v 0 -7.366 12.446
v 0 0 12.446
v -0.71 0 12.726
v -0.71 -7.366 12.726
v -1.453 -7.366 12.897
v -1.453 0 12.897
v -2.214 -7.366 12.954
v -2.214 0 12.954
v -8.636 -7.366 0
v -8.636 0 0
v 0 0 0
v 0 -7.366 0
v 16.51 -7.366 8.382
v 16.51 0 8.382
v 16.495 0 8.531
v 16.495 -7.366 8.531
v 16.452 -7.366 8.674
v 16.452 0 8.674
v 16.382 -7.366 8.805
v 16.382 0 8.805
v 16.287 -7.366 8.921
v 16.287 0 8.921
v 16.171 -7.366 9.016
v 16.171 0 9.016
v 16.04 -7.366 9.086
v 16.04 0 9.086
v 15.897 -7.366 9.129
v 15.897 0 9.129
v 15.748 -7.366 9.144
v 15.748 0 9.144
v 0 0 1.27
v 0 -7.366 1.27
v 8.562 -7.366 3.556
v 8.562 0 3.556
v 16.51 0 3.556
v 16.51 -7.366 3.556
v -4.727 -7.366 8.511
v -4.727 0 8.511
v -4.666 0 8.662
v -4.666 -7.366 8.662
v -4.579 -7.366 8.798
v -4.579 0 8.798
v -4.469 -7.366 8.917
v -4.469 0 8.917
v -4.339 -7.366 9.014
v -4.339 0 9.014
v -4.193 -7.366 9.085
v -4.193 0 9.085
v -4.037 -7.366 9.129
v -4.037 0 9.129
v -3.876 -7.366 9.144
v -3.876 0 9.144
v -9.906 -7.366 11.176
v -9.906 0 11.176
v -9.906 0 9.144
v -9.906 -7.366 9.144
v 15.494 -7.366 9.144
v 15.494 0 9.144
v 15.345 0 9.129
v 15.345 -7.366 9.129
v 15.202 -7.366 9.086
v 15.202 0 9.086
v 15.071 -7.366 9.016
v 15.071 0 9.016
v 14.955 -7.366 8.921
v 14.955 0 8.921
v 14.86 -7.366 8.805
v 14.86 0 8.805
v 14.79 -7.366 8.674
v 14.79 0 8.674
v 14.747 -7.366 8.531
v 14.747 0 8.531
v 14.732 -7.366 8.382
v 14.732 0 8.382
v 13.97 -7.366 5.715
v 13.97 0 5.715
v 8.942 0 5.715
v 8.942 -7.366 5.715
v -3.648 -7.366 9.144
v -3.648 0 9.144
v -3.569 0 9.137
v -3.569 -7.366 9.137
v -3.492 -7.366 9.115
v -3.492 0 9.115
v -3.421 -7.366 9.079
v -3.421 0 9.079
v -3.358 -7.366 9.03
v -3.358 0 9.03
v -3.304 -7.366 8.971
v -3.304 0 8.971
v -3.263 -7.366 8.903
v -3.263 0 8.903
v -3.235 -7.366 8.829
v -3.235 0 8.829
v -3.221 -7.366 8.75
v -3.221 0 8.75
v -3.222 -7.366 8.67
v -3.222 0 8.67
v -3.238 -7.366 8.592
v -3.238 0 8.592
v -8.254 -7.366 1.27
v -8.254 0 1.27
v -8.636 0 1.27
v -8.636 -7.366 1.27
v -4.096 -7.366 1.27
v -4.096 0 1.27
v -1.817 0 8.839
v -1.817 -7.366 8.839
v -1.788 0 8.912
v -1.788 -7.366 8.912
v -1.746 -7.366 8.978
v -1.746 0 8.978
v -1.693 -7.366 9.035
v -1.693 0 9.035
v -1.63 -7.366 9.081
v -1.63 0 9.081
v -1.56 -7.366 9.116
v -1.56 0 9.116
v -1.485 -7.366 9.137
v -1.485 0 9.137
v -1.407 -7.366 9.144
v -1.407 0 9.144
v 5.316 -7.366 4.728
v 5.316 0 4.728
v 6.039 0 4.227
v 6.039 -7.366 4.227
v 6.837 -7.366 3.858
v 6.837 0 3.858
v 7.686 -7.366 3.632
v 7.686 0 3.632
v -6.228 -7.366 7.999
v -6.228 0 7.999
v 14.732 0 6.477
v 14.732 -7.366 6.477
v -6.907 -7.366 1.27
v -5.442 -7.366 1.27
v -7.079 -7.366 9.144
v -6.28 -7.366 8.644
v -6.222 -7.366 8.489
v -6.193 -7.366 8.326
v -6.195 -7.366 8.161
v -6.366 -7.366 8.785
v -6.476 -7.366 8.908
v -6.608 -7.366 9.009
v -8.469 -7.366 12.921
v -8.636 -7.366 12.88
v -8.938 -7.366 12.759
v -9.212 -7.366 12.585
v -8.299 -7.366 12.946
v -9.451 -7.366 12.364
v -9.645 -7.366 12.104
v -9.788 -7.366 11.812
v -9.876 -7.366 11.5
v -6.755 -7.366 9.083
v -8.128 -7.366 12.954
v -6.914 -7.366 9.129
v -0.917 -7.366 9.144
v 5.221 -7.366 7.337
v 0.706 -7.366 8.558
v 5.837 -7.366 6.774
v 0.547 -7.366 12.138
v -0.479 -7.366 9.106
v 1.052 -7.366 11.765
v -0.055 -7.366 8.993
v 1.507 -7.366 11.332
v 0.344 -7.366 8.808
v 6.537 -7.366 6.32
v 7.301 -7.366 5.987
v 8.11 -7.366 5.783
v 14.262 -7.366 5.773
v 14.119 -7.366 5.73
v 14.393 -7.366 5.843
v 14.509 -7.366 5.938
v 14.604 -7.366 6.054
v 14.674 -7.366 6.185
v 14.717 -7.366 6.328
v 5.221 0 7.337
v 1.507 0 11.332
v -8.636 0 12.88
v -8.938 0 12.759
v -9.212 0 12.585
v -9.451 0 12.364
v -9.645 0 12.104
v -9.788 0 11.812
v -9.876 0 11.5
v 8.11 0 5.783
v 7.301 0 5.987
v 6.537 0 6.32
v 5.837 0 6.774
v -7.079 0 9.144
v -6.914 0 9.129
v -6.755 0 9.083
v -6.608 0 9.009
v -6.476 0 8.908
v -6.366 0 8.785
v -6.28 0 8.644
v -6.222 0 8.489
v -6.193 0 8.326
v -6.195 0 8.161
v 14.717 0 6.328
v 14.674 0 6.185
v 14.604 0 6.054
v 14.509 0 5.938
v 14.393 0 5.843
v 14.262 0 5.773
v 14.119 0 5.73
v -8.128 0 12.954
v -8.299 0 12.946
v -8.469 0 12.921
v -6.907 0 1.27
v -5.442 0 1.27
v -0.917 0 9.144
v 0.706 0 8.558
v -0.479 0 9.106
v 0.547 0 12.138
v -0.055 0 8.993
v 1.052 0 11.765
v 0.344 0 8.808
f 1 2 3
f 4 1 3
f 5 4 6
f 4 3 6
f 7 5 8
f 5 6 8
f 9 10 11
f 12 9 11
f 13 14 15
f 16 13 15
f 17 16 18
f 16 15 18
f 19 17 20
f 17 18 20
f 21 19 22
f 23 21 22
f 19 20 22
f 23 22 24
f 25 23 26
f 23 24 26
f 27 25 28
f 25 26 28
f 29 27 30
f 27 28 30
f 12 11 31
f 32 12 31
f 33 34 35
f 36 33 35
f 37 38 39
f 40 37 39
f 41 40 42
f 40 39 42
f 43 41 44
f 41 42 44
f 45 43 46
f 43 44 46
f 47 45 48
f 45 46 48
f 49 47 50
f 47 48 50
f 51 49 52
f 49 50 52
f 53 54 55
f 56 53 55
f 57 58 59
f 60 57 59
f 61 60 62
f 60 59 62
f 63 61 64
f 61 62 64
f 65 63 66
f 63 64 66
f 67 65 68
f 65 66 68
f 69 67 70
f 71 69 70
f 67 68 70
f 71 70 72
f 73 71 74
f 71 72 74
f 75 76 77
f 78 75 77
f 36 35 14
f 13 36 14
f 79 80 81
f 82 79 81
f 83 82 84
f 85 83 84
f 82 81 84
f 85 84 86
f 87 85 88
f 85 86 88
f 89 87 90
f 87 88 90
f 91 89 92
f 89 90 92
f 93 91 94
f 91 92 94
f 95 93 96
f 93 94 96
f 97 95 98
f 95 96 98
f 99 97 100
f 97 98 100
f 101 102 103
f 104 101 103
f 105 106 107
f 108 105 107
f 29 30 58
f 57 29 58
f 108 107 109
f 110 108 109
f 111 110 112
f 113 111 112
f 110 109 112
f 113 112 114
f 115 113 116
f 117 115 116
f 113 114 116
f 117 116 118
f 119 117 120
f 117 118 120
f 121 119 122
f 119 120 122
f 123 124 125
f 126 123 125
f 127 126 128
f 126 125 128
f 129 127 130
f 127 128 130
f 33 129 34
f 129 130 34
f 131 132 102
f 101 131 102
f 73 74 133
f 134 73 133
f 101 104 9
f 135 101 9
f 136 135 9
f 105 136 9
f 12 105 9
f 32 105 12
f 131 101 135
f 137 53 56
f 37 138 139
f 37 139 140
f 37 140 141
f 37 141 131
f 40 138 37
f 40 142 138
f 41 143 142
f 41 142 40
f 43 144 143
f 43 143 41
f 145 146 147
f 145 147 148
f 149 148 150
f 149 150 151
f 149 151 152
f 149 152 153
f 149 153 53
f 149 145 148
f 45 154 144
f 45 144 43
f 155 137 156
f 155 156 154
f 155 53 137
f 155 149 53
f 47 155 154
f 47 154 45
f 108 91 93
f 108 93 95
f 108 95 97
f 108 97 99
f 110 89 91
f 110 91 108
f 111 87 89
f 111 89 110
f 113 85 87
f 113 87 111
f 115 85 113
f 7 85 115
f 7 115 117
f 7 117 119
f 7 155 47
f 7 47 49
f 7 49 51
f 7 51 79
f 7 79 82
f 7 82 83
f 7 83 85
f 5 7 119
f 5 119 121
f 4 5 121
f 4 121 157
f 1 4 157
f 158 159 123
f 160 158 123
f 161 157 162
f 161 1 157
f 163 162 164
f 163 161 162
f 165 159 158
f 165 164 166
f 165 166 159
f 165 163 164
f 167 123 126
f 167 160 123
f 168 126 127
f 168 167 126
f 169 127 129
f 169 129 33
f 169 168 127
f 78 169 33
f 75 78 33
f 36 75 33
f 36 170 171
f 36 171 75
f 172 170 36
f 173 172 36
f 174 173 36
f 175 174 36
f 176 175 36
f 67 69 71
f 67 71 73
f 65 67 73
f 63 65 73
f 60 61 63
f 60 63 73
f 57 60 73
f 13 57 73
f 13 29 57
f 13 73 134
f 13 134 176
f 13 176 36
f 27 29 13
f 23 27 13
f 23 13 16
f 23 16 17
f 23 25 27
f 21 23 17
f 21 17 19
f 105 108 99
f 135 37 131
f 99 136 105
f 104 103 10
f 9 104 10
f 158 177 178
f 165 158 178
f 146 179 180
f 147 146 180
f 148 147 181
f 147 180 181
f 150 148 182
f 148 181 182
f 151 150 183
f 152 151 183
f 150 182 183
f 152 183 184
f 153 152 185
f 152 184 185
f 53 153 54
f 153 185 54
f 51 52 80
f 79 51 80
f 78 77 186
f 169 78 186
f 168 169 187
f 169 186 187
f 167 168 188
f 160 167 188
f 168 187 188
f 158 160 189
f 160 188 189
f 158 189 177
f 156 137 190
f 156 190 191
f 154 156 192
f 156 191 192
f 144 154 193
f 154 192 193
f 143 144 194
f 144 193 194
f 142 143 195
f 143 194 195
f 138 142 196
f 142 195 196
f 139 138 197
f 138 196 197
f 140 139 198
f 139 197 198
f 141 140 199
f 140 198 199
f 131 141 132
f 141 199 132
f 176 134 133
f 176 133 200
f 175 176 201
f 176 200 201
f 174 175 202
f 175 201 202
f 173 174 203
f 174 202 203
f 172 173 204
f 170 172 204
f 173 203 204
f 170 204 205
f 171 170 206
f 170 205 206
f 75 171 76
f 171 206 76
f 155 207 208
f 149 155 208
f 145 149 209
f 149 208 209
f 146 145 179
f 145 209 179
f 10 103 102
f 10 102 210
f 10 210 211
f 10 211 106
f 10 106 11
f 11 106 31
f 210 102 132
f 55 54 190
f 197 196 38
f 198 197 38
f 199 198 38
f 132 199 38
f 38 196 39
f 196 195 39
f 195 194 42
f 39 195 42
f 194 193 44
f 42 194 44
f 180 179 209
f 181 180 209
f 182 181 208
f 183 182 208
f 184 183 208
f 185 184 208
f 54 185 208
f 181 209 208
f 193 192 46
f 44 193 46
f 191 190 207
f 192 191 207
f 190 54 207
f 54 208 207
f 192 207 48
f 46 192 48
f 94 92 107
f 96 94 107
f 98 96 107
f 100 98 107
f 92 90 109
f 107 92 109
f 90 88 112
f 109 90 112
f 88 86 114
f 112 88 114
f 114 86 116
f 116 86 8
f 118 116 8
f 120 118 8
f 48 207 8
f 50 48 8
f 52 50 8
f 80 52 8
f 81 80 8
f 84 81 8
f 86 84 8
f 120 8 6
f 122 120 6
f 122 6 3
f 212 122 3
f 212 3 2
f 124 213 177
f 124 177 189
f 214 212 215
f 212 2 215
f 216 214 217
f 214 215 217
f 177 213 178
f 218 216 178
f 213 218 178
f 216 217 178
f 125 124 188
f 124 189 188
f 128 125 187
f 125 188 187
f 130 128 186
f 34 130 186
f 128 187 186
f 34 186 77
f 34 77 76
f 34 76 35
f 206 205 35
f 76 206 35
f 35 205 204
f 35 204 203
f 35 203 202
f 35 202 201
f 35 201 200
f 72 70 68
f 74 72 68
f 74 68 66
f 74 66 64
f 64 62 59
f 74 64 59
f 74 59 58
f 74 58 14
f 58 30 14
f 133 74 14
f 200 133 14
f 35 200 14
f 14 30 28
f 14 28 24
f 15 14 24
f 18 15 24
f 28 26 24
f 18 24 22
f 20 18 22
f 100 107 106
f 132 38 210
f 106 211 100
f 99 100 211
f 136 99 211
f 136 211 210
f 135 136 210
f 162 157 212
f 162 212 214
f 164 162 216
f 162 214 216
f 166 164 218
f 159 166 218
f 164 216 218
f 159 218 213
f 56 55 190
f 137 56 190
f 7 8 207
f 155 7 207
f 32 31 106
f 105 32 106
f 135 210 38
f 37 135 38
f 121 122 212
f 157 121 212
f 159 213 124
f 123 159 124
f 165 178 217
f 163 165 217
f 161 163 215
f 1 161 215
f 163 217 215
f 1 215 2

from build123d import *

# Parameters (mm, degrees)
F1_DEPTH = 7.366


with BuildPart() as f1:
    # F0 (on Front) → F1 (new body)
    with BuildSketch(Plane.XZ):
        with BuildLine():
            Line((-2.213933, 12.954), (-8.128, 12.954))
            ThreePointArc((-8.128, 12.954), (-8.384689, 12.935373), (-8.636, 12.879884))
            Line((-8.636, 12.879884), (-8.636, 9.144))
            Line((-8.636, 9.144), (-7.079154, 9.144))
            ThreePointArc((-7.079154, 9.144), (-6.365658, 8.785324), (-6.227896, 7.998719))
            Line((-6.227896, 7.998719), (-8.253652, 1.27))
            Line((-8.253652, 1.27), (-6.907021, 1.27))
            Line((-6.907021, 1.27), (-4.726952, 8.511281))
            ThreePointArc((-4.726952, 8.511281), (-4.406018, 8.968497), (-3.875693, 9.144))
            Line((-3.875693, 9.144), (-3.648131, 9.144))
            ThreePointArc((-3.648131, 9.144), (-3.304393, 8.971202), (-3.238025, 8.592243))
            Line((-3.238025, 8.592243), (-5.442468, 1.27))
            Line((-5.442468, 1.27), (-4.095837, 1.27))
            Line((-4.095837, 1.27), (-1.817051, 8.839178))
            ThreePointArc((-1.817051, 8.839178), (-1.662436, 9.059449), (-1.406944, 9.144))
            Line((-1.406944, 9.144), (-0.917281, 9.144))
            ThreePointArc((-0.917281, 9.144), (-0.054535, 8.992989), (0.705625, 8.557913))
            Line((0.705625, 8.557913), (5.316478, 4.728173))
            ThreePointArc((5.316478, 4.728173), (6.836798, 3.858021), (8.562289, 3.556))
            Line((8.562289, 3.556), (10.439335, 3.556))
            Line((10.439335, 3.556), (16.51, 3.556))
            Line((16.51, 3.556), (16.51, 8.382))
            ThreePointArc((16.51, 8.382), (16.286815, 8.920815), (15.748, 9.144))
            Line((15.748, 9.144), (15.494, 9.144))
            ThreePointArc((15.494, 9.144), (14.955185, 8.920815), (14.732, 8.382))
            Line((14.732, 8.382), (14.732, 6.477))
            ThreePointArc((14.732, 6.477), (14.508815, 5.938185), (13.97, 5.715))
            Line((13.97, 5.715), (10.439335, 5.715))
            Line((10.439335, 5.715), (8.941661, 5.715))
            ThreePointArc((8.941661, 5.715), (6.912095, 6.138042), (5.220557, 7.336708))
            Line((5.220557, 7.336708), (1.507171, 11.332292))
            ThreePointArc((1.507171, 11.332292), (0.805397, 11.959345), (0, 12.446188))
            ThreePointArc((0, 12.446188), (-1.078221, 12.82542), (-2.213933, 12.954))
        make_face()
        with BuildLine():
            Line((-8.636, 9.144), (-8.636, 12.879884))
            ThreePointArc((-8.636, 12.879884), (-9.553571, 12.238558), (-9.906, 11.176))
            Line((-9.906, 11.176), (-9.906, 9.144))
            Line((-9.906, 9.144), (-8.636, 9.144))
        make_face()
        Polygon((-6.907021, 1.27), (-8.253652, 1.27), (-8.636, 1.27), (-8.636, 0), (0, 0), (0, 1.27), (-4.095837, 1.27), (-5.442468, 1.27), align=None)
    extrude(amount=F1_DEPTH)


solid = f1.part
